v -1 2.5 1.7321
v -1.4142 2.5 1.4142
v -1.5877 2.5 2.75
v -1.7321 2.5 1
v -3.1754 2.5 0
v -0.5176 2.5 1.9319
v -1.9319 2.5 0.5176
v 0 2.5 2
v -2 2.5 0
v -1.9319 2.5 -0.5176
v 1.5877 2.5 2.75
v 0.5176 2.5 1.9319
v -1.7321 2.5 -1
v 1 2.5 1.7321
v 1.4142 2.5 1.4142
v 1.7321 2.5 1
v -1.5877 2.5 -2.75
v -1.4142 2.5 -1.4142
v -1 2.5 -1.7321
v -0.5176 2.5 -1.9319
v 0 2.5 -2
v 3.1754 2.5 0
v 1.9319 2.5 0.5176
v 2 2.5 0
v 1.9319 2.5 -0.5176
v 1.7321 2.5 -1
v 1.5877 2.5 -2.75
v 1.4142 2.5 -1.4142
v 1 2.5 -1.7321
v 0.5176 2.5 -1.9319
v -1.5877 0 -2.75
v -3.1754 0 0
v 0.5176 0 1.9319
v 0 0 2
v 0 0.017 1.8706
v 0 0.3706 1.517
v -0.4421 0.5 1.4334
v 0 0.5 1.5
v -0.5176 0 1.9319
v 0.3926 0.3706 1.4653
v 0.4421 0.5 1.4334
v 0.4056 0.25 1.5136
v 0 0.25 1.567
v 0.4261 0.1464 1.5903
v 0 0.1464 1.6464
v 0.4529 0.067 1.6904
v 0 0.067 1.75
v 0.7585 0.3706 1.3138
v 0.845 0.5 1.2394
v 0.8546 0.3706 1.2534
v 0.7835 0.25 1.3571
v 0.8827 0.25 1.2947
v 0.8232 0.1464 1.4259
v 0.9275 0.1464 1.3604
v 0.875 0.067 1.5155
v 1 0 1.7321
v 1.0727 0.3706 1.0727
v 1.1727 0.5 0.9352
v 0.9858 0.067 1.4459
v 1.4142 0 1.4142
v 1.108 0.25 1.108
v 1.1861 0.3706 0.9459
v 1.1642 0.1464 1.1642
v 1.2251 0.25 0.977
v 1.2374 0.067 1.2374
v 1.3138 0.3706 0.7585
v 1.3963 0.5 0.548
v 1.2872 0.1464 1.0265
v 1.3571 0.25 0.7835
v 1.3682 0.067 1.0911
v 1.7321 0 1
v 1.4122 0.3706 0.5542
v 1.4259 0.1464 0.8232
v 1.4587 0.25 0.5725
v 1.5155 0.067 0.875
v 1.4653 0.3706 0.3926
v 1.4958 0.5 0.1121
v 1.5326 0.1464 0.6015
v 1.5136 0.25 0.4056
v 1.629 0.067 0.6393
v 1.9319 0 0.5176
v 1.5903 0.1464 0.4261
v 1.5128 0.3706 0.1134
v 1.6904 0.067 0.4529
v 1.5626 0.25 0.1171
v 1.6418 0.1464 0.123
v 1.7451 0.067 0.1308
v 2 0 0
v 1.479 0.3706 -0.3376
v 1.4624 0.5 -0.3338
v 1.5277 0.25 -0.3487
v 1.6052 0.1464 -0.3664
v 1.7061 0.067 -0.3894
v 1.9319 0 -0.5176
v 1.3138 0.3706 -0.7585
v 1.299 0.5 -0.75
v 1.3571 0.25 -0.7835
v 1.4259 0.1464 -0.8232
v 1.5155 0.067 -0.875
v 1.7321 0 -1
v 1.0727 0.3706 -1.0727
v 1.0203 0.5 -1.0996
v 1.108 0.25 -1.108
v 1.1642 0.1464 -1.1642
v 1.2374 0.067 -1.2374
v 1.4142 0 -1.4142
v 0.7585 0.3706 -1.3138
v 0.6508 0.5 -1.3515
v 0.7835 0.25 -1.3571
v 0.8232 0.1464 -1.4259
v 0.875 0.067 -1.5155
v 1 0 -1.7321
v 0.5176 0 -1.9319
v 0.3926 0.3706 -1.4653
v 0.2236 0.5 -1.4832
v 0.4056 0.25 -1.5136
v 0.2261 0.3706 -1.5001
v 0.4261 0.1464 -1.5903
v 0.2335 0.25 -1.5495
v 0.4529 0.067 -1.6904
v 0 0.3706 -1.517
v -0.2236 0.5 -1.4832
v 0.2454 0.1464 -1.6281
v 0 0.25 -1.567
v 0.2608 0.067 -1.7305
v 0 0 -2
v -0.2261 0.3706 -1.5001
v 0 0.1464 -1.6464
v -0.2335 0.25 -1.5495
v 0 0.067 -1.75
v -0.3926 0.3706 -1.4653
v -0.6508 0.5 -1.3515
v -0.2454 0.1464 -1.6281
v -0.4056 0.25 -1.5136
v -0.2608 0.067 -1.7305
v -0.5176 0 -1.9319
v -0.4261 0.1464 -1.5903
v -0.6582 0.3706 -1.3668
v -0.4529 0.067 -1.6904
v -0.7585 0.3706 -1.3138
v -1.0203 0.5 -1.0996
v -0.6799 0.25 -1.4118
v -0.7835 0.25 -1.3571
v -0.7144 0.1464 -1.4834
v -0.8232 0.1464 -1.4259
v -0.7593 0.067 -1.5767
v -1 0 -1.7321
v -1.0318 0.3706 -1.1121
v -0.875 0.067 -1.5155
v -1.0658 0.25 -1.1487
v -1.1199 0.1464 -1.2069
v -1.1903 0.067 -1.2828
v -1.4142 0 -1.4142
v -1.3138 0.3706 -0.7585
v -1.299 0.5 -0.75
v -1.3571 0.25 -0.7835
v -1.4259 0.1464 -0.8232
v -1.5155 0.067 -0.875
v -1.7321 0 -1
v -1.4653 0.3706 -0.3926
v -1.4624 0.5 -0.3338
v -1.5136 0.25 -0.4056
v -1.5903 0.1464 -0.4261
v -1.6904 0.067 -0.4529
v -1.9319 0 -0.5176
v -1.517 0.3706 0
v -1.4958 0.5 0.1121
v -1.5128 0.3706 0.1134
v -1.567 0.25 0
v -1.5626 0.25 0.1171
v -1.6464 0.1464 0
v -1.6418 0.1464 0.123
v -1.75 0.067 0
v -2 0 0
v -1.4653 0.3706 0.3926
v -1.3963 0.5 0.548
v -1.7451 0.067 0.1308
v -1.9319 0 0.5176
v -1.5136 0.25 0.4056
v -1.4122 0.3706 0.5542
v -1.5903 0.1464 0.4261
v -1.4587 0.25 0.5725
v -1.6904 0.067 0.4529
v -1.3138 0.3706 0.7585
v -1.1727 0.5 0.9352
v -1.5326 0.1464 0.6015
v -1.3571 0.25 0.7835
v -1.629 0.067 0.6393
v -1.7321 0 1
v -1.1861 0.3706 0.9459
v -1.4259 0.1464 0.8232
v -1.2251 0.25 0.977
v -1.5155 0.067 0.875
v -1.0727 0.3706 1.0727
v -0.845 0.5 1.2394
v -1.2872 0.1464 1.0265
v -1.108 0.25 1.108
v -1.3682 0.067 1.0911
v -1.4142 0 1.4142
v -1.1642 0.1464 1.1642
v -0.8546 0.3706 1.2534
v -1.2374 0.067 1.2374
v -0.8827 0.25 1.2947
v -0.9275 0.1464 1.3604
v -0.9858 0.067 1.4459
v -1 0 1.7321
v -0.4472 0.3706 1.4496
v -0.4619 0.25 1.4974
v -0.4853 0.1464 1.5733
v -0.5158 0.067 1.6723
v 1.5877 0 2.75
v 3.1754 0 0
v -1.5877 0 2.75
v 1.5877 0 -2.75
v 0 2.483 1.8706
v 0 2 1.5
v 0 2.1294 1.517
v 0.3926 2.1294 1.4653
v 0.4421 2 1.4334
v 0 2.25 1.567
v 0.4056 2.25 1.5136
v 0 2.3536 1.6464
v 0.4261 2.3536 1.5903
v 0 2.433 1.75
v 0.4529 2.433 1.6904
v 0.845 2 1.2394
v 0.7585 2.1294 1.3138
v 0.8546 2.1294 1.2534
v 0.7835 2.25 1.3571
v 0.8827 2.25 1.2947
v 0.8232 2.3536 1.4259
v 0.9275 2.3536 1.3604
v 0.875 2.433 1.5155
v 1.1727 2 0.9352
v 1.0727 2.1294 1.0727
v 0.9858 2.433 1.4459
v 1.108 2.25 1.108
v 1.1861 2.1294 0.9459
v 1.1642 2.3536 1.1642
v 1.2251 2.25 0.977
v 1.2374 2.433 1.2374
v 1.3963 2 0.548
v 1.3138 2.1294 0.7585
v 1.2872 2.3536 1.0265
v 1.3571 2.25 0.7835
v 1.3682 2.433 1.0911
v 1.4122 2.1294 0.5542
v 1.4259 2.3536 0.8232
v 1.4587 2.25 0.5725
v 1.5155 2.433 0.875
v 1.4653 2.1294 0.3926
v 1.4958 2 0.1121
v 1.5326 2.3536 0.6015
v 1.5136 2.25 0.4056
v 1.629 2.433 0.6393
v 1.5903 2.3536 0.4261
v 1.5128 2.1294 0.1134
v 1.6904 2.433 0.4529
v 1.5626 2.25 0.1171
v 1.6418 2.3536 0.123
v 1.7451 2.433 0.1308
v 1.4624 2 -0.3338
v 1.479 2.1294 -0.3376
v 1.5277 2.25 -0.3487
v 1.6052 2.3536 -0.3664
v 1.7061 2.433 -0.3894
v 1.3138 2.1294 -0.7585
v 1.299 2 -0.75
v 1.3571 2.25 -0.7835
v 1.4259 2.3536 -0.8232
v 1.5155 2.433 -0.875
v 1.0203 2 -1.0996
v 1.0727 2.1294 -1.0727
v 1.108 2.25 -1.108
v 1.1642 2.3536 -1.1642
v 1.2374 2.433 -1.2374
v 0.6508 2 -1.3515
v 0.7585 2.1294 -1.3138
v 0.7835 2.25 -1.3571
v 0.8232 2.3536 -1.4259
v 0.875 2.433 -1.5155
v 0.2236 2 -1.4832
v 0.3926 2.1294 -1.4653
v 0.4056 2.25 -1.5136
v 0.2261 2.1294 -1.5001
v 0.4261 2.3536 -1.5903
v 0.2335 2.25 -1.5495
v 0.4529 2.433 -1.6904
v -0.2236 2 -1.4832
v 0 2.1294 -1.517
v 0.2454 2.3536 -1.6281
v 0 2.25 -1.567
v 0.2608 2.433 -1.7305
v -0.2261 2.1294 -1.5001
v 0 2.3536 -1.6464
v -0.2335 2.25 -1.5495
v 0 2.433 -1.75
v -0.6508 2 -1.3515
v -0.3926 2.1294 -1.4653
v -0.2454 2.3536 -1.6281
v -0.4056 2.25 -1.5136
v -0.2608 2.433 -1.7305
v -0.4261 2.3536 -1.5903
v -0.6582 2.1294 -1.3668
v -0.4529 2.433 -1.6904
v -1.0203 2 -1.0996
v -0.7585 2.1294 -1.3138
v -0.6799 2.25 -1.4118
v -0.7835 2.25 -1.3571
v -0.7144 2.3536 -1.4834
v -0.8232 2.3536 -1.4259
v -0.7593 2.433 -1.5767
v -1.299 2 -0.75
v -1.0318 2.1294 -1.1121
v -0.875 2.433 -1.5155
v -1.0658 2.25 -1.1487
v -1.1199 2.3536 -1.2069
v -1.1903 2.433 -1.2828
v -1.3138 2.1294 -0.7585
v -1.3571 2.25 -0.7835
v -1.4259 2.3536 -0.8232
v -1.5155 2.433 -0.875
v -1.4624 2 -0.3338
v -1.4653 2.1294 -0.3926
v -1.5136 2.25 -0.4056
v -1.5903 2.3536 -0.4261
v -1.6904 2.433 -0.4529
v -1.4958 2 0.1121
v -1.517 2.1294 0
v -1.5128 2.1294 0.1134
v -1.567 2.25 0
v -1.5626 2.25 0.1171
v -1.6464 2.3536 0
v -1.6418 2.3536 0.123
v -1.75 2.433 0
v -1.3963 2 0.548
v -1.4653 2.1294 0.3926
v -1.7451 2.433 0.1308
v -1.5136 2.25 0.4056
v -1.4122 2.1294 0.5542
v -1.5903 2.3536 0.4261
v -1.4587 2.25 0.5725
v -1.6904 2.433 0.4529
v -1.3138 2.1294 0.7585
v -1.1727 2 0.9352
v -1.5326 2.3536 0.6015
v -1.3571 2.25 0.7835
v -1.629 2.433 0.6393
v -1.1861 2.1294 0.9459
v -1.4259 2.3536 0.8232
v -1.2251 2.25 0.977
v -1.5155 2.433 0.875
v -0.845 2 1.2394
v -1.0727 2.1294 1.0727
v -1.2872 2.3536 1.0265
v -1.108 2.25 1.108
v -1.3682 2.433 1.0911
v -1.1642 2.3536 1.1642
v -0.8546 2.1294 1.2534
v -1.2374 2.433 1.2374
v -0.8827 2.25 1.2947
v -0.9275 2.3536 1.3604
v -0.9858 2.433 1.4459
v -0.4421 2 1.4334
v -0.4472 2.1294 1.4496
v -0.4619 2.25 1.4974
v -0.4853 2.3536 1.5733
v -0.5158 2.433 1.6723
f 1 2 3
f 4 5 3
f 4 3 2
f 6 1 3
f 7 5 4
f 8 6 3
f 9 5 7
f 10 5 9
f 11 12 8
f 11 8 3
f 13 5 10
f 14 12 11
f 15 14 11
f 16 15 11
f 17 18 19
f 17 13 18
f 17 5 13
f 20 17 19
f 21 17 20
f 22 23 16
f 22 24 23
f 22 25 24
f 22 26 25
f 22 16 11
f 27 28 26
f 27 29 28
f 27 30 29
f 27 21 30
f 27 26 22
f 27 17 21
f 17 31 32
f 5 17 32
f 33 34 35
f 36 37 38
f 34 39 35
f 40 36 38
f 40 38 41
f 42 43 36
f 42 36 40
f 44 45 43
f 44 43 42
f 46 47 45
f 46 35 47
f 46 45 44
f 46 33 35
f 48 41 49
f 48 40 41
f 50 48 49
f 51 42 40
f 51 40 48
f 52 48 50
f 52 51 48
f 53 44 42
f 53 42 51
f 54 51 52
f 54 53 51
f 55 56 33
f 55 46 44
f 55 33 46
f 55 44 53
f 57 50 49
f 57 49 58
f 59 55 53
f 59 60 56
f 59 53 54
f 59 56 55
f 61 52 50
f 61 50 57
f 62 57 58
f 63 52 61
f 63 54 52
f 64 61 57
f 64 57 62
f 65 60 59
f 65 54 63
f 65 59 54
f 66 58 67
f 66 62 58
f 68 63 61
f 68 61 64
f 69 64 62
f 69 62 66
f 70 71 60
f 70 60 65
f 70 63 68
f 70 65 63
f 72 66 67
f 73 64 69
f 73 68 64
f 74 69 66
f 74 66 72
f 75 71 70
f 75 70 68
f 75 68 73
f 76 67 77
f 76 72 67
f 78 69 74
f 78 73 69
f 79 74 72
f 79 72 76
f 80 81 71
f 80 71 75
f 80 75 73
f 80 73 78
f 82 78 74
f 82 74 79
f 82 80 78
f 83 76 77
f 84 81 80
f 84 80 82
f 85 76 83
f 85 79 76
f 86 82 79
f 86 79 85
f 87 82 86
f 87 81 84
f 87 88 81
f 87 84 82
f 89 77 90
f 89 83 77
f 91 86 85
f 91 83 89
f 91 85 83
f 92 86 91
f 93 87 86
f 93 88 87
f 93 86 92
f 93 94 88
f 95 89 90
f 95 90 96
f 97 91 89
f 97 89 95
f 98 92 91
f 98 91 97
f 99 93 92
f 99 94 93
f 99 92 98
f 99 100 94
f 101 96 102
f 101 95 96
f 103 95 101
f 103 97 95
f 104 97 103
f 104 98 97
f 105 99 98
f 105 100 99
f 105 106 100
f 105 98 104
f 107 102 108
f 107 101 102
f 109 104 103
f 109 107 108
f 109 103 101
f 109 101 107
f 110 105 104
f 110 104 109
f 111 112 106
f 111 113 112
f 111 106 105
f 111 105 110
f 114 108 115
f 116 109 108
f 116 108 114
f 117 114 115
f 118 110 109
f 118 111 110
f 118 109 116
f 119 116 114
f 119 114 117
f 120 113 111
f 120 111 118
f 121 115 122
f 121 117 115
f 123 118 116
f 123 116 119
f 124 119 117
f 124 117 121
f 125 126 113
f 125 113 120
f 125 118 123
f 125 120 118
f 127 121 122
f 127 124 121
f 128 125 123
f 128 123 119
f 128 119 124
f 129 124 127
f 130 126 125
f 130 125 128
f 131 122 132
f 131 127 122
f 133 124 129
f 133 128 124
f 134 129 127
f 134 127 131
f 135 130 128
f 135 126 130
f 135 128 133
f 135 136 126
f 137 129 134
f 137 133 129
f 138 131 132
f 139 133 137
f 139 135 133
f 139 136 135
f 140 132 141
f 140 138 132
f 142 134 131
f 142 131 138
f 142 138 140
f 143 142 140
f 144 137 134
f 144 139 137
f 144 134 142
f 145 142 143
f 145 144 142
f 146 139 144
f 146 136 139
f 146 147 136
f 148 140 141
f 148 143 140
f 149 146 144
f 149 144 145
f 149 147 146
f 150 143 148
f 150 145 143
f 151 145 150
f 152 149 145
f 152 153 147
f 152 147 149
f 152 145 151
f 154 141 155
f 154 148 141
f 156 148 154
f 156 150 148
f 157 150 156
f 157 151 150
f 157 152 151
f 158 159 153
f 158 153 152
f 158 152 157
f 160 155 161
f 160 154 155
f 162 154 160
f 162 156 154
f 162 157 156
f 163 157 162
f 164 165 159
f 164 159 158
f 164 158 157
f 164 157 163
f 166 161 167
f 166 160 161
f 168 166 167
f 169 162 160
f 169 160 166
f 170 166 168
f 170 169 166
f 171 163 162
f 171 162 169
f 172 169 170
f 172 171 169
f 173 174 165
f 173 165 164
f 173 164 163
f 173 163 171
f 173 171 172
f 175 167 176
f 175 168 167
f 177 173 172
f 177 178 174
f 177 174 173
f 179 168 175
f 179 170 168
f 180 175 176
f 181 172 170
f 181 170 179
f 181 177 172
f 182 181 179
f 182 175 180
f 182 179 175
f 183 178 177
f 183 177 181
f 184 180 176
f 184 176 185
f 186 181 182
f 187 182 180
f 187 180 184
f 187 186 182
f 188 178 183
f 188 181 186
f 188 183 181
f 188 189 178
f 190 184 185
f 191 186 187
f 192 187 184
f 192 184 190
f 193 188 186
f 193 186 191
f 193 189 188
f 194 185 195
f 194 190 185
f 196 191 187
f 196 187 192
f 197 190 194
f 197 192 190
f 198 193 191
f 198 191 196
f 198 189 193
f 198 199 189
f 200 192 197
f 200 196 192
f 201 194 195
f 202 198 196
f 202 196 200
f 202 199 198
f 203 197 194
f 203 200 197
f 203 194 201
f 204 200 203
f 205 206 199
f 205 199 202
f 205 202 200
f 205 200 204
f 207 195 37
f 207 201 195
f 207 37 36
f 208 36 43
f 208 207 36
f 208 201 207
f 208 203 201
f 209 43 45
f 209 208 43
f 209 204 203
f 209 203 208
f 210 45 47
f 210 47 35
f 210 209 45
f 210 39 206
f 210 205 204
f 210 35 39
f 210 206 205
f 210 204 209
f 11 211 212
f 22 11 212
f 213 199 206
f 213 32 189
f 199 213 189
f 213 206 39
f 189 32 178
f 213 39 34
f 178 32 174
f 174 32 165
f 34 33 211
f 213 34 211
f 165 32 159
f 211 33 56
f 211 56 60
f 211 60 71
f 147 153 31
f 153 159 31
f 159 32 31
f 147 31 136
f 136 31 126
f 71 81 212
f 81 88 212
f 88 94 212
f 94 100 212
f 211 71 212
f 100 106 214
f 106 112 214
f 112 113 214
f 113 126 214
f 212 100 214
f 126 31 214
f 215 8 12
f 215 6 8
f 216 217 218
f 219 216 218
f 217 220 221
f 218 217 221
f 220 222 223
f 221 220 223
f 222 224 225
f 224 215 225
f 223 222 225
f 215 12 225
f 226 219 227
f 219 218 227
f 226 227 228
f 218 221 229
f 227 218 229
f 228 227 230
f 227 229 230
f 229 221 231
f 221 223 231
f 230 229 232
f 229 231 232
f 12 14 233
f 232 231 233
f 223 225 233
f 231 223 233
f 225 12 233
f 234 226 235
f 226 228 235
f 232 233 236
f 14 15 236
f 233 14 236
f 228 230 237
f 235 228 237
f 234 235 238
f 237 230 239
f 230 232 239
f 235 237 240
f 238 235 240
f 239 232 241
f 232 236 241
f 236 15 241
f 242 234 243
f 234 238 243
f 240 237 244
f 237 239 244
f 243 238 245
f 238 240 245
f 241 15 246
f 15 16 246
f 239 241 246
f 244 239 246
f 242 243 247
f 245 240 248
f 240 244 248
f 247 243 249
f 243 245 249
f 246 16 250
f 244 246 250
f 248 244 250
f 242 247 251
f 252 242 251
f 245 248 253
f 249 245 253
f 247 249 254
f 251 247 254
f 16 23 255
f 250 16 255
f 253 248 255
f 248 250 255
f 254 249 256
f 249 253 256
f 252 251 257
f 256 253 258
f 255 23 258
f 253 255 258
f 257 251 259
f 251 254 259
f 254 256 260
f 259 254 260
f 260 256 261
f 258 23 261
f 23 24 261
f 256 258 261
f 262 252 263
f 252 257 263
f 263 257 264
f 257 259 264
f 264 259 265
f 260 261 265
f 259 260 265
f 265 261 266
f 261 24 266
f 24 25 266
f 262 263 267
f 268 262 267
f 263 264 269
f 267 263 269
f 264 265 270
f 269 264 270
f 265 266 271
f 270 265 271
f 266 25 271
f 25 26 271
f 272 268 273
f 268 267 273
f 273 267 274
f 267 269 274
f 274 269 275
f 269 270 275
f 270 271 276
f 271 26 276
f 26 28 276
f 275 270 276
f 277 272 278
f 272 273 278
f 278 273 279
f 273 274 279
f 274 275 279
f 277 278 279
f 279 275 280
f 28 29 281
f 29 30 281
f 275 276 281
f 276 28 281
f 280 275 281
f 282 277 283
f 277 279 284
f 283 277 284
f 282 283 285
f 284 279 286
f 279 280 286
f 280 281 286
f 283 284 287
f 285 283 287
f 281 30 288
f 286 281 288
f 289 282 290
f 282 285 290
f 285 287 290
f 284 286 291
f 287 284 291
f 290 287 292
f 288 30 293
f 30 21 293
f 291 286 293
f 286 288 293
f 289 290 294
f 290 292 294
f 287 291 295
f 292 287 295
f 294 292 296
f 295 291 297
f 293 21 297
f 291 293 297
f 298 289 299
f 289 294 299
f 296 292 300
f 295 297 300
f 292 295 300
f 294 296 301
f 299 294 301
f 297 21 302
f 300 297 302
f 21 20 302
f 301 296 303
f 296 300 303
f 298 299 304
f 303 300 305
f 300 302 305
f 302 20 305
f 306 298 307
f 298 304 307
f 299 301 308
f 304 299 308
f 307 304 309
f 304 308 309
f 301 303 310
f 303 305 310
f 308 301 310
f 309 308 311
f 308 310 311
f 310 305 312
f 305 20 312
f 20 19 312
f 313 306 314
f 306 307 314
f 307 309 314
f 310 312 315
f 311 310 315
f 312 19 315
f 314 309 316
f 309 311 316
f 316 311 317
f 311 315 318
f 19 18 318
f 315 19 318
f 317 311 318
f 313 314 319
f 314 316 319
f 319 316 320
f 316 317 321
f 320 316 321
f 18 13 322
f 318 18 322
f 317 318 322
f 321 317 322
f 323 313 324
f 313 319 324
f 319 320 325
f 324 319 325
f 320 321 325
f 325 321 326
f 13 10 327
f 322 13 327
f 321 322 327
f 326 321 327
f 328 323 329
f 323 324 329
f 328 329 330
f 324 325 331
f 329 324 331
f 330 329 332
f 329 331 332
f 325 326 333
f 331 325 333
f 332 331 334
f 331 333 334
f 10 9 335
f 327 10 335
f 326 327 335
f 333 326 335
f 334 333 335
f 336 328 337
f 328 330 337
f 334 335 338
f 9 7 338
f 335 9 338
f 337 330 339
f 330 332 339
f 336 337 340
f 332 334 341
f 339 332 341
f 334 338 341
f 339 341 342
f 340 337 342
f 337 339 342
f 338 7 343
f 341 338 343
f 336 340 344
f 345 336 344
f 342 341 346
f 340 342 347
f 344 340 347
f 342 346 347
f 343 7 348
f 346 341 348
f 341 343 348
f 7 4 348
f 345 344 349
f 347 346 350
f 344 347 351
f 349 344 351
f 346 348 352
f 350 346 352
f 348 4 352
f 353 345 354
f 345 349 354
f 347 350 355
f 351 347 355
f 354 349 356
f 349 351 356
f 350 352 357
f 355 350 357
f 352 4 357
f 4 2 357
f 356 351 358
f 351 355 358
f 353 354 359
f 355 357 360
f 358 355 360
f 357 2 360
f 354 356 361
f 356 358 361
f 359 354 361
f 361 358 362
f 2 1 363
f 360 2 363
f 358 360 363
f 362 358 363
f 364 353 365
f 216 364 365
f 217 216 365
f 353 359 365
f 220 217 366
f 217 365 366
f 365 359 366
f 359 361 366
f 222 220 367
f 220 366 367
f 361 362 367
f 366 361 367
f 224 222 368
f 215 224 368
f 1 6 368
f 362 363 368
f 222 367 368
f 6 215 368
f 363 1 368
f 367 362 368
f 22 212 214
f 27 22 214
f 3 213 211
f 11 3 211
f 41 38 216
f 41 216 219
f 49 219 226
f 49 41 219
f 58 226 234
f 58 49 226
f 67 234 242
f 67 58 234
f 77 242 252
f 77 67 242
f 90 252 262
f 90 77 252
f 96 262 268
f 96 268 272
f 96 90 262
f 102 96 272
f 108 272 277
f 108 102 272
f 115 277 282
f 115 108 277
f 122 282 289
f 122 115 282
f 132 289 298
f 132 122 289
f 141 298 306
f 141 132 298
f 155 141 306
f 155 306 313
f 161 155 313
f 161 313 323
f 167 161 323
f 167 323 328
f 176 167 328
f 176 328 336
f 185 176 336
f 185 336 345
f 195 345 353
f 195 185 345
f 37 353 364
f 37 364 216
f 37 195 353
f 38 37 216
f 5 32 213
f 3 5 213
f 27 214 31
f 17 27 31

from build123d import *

# Parameters (mm, degrees)
SKETCH1_R           = 1.5
BOSS_EXTRUDE1_DEPTH = 2.5
FILLET1_R           = 0.5


with BuildPart() as part:
    # Sketch1 → Boss-Extrude1 (new body)
    with BuildSketch(Plane(origin=(0, 0, 0), x_dir=(1, 0, 0), z_dir=(0, 1, 0))):
        Polygon((-3.175426481, 0), (-1.58771324, -2.75), (1.58771324, -2.75), (3.175426481, 0), (1.58771324, 2.75), (-1.58771324, 2.75), align=None)
        with Locations(Location((0, 0, 0), (0, 0, 270))):
            Circle(SKETCH1_R, mode=Mode.SUBTRACT)
    extrude(amount=BOSS_EXTRUDE1_DEPTH)

    # Fillet1
    fillet1_edges = [part.edges().sort_by_distance(p)[0] for p in [
        (0, 0, -1.5),
        (0, 2.5, -1.5),
    ]]
    fillet(fillet1_edges, radius=FILLET1_R)


solid = part.part
